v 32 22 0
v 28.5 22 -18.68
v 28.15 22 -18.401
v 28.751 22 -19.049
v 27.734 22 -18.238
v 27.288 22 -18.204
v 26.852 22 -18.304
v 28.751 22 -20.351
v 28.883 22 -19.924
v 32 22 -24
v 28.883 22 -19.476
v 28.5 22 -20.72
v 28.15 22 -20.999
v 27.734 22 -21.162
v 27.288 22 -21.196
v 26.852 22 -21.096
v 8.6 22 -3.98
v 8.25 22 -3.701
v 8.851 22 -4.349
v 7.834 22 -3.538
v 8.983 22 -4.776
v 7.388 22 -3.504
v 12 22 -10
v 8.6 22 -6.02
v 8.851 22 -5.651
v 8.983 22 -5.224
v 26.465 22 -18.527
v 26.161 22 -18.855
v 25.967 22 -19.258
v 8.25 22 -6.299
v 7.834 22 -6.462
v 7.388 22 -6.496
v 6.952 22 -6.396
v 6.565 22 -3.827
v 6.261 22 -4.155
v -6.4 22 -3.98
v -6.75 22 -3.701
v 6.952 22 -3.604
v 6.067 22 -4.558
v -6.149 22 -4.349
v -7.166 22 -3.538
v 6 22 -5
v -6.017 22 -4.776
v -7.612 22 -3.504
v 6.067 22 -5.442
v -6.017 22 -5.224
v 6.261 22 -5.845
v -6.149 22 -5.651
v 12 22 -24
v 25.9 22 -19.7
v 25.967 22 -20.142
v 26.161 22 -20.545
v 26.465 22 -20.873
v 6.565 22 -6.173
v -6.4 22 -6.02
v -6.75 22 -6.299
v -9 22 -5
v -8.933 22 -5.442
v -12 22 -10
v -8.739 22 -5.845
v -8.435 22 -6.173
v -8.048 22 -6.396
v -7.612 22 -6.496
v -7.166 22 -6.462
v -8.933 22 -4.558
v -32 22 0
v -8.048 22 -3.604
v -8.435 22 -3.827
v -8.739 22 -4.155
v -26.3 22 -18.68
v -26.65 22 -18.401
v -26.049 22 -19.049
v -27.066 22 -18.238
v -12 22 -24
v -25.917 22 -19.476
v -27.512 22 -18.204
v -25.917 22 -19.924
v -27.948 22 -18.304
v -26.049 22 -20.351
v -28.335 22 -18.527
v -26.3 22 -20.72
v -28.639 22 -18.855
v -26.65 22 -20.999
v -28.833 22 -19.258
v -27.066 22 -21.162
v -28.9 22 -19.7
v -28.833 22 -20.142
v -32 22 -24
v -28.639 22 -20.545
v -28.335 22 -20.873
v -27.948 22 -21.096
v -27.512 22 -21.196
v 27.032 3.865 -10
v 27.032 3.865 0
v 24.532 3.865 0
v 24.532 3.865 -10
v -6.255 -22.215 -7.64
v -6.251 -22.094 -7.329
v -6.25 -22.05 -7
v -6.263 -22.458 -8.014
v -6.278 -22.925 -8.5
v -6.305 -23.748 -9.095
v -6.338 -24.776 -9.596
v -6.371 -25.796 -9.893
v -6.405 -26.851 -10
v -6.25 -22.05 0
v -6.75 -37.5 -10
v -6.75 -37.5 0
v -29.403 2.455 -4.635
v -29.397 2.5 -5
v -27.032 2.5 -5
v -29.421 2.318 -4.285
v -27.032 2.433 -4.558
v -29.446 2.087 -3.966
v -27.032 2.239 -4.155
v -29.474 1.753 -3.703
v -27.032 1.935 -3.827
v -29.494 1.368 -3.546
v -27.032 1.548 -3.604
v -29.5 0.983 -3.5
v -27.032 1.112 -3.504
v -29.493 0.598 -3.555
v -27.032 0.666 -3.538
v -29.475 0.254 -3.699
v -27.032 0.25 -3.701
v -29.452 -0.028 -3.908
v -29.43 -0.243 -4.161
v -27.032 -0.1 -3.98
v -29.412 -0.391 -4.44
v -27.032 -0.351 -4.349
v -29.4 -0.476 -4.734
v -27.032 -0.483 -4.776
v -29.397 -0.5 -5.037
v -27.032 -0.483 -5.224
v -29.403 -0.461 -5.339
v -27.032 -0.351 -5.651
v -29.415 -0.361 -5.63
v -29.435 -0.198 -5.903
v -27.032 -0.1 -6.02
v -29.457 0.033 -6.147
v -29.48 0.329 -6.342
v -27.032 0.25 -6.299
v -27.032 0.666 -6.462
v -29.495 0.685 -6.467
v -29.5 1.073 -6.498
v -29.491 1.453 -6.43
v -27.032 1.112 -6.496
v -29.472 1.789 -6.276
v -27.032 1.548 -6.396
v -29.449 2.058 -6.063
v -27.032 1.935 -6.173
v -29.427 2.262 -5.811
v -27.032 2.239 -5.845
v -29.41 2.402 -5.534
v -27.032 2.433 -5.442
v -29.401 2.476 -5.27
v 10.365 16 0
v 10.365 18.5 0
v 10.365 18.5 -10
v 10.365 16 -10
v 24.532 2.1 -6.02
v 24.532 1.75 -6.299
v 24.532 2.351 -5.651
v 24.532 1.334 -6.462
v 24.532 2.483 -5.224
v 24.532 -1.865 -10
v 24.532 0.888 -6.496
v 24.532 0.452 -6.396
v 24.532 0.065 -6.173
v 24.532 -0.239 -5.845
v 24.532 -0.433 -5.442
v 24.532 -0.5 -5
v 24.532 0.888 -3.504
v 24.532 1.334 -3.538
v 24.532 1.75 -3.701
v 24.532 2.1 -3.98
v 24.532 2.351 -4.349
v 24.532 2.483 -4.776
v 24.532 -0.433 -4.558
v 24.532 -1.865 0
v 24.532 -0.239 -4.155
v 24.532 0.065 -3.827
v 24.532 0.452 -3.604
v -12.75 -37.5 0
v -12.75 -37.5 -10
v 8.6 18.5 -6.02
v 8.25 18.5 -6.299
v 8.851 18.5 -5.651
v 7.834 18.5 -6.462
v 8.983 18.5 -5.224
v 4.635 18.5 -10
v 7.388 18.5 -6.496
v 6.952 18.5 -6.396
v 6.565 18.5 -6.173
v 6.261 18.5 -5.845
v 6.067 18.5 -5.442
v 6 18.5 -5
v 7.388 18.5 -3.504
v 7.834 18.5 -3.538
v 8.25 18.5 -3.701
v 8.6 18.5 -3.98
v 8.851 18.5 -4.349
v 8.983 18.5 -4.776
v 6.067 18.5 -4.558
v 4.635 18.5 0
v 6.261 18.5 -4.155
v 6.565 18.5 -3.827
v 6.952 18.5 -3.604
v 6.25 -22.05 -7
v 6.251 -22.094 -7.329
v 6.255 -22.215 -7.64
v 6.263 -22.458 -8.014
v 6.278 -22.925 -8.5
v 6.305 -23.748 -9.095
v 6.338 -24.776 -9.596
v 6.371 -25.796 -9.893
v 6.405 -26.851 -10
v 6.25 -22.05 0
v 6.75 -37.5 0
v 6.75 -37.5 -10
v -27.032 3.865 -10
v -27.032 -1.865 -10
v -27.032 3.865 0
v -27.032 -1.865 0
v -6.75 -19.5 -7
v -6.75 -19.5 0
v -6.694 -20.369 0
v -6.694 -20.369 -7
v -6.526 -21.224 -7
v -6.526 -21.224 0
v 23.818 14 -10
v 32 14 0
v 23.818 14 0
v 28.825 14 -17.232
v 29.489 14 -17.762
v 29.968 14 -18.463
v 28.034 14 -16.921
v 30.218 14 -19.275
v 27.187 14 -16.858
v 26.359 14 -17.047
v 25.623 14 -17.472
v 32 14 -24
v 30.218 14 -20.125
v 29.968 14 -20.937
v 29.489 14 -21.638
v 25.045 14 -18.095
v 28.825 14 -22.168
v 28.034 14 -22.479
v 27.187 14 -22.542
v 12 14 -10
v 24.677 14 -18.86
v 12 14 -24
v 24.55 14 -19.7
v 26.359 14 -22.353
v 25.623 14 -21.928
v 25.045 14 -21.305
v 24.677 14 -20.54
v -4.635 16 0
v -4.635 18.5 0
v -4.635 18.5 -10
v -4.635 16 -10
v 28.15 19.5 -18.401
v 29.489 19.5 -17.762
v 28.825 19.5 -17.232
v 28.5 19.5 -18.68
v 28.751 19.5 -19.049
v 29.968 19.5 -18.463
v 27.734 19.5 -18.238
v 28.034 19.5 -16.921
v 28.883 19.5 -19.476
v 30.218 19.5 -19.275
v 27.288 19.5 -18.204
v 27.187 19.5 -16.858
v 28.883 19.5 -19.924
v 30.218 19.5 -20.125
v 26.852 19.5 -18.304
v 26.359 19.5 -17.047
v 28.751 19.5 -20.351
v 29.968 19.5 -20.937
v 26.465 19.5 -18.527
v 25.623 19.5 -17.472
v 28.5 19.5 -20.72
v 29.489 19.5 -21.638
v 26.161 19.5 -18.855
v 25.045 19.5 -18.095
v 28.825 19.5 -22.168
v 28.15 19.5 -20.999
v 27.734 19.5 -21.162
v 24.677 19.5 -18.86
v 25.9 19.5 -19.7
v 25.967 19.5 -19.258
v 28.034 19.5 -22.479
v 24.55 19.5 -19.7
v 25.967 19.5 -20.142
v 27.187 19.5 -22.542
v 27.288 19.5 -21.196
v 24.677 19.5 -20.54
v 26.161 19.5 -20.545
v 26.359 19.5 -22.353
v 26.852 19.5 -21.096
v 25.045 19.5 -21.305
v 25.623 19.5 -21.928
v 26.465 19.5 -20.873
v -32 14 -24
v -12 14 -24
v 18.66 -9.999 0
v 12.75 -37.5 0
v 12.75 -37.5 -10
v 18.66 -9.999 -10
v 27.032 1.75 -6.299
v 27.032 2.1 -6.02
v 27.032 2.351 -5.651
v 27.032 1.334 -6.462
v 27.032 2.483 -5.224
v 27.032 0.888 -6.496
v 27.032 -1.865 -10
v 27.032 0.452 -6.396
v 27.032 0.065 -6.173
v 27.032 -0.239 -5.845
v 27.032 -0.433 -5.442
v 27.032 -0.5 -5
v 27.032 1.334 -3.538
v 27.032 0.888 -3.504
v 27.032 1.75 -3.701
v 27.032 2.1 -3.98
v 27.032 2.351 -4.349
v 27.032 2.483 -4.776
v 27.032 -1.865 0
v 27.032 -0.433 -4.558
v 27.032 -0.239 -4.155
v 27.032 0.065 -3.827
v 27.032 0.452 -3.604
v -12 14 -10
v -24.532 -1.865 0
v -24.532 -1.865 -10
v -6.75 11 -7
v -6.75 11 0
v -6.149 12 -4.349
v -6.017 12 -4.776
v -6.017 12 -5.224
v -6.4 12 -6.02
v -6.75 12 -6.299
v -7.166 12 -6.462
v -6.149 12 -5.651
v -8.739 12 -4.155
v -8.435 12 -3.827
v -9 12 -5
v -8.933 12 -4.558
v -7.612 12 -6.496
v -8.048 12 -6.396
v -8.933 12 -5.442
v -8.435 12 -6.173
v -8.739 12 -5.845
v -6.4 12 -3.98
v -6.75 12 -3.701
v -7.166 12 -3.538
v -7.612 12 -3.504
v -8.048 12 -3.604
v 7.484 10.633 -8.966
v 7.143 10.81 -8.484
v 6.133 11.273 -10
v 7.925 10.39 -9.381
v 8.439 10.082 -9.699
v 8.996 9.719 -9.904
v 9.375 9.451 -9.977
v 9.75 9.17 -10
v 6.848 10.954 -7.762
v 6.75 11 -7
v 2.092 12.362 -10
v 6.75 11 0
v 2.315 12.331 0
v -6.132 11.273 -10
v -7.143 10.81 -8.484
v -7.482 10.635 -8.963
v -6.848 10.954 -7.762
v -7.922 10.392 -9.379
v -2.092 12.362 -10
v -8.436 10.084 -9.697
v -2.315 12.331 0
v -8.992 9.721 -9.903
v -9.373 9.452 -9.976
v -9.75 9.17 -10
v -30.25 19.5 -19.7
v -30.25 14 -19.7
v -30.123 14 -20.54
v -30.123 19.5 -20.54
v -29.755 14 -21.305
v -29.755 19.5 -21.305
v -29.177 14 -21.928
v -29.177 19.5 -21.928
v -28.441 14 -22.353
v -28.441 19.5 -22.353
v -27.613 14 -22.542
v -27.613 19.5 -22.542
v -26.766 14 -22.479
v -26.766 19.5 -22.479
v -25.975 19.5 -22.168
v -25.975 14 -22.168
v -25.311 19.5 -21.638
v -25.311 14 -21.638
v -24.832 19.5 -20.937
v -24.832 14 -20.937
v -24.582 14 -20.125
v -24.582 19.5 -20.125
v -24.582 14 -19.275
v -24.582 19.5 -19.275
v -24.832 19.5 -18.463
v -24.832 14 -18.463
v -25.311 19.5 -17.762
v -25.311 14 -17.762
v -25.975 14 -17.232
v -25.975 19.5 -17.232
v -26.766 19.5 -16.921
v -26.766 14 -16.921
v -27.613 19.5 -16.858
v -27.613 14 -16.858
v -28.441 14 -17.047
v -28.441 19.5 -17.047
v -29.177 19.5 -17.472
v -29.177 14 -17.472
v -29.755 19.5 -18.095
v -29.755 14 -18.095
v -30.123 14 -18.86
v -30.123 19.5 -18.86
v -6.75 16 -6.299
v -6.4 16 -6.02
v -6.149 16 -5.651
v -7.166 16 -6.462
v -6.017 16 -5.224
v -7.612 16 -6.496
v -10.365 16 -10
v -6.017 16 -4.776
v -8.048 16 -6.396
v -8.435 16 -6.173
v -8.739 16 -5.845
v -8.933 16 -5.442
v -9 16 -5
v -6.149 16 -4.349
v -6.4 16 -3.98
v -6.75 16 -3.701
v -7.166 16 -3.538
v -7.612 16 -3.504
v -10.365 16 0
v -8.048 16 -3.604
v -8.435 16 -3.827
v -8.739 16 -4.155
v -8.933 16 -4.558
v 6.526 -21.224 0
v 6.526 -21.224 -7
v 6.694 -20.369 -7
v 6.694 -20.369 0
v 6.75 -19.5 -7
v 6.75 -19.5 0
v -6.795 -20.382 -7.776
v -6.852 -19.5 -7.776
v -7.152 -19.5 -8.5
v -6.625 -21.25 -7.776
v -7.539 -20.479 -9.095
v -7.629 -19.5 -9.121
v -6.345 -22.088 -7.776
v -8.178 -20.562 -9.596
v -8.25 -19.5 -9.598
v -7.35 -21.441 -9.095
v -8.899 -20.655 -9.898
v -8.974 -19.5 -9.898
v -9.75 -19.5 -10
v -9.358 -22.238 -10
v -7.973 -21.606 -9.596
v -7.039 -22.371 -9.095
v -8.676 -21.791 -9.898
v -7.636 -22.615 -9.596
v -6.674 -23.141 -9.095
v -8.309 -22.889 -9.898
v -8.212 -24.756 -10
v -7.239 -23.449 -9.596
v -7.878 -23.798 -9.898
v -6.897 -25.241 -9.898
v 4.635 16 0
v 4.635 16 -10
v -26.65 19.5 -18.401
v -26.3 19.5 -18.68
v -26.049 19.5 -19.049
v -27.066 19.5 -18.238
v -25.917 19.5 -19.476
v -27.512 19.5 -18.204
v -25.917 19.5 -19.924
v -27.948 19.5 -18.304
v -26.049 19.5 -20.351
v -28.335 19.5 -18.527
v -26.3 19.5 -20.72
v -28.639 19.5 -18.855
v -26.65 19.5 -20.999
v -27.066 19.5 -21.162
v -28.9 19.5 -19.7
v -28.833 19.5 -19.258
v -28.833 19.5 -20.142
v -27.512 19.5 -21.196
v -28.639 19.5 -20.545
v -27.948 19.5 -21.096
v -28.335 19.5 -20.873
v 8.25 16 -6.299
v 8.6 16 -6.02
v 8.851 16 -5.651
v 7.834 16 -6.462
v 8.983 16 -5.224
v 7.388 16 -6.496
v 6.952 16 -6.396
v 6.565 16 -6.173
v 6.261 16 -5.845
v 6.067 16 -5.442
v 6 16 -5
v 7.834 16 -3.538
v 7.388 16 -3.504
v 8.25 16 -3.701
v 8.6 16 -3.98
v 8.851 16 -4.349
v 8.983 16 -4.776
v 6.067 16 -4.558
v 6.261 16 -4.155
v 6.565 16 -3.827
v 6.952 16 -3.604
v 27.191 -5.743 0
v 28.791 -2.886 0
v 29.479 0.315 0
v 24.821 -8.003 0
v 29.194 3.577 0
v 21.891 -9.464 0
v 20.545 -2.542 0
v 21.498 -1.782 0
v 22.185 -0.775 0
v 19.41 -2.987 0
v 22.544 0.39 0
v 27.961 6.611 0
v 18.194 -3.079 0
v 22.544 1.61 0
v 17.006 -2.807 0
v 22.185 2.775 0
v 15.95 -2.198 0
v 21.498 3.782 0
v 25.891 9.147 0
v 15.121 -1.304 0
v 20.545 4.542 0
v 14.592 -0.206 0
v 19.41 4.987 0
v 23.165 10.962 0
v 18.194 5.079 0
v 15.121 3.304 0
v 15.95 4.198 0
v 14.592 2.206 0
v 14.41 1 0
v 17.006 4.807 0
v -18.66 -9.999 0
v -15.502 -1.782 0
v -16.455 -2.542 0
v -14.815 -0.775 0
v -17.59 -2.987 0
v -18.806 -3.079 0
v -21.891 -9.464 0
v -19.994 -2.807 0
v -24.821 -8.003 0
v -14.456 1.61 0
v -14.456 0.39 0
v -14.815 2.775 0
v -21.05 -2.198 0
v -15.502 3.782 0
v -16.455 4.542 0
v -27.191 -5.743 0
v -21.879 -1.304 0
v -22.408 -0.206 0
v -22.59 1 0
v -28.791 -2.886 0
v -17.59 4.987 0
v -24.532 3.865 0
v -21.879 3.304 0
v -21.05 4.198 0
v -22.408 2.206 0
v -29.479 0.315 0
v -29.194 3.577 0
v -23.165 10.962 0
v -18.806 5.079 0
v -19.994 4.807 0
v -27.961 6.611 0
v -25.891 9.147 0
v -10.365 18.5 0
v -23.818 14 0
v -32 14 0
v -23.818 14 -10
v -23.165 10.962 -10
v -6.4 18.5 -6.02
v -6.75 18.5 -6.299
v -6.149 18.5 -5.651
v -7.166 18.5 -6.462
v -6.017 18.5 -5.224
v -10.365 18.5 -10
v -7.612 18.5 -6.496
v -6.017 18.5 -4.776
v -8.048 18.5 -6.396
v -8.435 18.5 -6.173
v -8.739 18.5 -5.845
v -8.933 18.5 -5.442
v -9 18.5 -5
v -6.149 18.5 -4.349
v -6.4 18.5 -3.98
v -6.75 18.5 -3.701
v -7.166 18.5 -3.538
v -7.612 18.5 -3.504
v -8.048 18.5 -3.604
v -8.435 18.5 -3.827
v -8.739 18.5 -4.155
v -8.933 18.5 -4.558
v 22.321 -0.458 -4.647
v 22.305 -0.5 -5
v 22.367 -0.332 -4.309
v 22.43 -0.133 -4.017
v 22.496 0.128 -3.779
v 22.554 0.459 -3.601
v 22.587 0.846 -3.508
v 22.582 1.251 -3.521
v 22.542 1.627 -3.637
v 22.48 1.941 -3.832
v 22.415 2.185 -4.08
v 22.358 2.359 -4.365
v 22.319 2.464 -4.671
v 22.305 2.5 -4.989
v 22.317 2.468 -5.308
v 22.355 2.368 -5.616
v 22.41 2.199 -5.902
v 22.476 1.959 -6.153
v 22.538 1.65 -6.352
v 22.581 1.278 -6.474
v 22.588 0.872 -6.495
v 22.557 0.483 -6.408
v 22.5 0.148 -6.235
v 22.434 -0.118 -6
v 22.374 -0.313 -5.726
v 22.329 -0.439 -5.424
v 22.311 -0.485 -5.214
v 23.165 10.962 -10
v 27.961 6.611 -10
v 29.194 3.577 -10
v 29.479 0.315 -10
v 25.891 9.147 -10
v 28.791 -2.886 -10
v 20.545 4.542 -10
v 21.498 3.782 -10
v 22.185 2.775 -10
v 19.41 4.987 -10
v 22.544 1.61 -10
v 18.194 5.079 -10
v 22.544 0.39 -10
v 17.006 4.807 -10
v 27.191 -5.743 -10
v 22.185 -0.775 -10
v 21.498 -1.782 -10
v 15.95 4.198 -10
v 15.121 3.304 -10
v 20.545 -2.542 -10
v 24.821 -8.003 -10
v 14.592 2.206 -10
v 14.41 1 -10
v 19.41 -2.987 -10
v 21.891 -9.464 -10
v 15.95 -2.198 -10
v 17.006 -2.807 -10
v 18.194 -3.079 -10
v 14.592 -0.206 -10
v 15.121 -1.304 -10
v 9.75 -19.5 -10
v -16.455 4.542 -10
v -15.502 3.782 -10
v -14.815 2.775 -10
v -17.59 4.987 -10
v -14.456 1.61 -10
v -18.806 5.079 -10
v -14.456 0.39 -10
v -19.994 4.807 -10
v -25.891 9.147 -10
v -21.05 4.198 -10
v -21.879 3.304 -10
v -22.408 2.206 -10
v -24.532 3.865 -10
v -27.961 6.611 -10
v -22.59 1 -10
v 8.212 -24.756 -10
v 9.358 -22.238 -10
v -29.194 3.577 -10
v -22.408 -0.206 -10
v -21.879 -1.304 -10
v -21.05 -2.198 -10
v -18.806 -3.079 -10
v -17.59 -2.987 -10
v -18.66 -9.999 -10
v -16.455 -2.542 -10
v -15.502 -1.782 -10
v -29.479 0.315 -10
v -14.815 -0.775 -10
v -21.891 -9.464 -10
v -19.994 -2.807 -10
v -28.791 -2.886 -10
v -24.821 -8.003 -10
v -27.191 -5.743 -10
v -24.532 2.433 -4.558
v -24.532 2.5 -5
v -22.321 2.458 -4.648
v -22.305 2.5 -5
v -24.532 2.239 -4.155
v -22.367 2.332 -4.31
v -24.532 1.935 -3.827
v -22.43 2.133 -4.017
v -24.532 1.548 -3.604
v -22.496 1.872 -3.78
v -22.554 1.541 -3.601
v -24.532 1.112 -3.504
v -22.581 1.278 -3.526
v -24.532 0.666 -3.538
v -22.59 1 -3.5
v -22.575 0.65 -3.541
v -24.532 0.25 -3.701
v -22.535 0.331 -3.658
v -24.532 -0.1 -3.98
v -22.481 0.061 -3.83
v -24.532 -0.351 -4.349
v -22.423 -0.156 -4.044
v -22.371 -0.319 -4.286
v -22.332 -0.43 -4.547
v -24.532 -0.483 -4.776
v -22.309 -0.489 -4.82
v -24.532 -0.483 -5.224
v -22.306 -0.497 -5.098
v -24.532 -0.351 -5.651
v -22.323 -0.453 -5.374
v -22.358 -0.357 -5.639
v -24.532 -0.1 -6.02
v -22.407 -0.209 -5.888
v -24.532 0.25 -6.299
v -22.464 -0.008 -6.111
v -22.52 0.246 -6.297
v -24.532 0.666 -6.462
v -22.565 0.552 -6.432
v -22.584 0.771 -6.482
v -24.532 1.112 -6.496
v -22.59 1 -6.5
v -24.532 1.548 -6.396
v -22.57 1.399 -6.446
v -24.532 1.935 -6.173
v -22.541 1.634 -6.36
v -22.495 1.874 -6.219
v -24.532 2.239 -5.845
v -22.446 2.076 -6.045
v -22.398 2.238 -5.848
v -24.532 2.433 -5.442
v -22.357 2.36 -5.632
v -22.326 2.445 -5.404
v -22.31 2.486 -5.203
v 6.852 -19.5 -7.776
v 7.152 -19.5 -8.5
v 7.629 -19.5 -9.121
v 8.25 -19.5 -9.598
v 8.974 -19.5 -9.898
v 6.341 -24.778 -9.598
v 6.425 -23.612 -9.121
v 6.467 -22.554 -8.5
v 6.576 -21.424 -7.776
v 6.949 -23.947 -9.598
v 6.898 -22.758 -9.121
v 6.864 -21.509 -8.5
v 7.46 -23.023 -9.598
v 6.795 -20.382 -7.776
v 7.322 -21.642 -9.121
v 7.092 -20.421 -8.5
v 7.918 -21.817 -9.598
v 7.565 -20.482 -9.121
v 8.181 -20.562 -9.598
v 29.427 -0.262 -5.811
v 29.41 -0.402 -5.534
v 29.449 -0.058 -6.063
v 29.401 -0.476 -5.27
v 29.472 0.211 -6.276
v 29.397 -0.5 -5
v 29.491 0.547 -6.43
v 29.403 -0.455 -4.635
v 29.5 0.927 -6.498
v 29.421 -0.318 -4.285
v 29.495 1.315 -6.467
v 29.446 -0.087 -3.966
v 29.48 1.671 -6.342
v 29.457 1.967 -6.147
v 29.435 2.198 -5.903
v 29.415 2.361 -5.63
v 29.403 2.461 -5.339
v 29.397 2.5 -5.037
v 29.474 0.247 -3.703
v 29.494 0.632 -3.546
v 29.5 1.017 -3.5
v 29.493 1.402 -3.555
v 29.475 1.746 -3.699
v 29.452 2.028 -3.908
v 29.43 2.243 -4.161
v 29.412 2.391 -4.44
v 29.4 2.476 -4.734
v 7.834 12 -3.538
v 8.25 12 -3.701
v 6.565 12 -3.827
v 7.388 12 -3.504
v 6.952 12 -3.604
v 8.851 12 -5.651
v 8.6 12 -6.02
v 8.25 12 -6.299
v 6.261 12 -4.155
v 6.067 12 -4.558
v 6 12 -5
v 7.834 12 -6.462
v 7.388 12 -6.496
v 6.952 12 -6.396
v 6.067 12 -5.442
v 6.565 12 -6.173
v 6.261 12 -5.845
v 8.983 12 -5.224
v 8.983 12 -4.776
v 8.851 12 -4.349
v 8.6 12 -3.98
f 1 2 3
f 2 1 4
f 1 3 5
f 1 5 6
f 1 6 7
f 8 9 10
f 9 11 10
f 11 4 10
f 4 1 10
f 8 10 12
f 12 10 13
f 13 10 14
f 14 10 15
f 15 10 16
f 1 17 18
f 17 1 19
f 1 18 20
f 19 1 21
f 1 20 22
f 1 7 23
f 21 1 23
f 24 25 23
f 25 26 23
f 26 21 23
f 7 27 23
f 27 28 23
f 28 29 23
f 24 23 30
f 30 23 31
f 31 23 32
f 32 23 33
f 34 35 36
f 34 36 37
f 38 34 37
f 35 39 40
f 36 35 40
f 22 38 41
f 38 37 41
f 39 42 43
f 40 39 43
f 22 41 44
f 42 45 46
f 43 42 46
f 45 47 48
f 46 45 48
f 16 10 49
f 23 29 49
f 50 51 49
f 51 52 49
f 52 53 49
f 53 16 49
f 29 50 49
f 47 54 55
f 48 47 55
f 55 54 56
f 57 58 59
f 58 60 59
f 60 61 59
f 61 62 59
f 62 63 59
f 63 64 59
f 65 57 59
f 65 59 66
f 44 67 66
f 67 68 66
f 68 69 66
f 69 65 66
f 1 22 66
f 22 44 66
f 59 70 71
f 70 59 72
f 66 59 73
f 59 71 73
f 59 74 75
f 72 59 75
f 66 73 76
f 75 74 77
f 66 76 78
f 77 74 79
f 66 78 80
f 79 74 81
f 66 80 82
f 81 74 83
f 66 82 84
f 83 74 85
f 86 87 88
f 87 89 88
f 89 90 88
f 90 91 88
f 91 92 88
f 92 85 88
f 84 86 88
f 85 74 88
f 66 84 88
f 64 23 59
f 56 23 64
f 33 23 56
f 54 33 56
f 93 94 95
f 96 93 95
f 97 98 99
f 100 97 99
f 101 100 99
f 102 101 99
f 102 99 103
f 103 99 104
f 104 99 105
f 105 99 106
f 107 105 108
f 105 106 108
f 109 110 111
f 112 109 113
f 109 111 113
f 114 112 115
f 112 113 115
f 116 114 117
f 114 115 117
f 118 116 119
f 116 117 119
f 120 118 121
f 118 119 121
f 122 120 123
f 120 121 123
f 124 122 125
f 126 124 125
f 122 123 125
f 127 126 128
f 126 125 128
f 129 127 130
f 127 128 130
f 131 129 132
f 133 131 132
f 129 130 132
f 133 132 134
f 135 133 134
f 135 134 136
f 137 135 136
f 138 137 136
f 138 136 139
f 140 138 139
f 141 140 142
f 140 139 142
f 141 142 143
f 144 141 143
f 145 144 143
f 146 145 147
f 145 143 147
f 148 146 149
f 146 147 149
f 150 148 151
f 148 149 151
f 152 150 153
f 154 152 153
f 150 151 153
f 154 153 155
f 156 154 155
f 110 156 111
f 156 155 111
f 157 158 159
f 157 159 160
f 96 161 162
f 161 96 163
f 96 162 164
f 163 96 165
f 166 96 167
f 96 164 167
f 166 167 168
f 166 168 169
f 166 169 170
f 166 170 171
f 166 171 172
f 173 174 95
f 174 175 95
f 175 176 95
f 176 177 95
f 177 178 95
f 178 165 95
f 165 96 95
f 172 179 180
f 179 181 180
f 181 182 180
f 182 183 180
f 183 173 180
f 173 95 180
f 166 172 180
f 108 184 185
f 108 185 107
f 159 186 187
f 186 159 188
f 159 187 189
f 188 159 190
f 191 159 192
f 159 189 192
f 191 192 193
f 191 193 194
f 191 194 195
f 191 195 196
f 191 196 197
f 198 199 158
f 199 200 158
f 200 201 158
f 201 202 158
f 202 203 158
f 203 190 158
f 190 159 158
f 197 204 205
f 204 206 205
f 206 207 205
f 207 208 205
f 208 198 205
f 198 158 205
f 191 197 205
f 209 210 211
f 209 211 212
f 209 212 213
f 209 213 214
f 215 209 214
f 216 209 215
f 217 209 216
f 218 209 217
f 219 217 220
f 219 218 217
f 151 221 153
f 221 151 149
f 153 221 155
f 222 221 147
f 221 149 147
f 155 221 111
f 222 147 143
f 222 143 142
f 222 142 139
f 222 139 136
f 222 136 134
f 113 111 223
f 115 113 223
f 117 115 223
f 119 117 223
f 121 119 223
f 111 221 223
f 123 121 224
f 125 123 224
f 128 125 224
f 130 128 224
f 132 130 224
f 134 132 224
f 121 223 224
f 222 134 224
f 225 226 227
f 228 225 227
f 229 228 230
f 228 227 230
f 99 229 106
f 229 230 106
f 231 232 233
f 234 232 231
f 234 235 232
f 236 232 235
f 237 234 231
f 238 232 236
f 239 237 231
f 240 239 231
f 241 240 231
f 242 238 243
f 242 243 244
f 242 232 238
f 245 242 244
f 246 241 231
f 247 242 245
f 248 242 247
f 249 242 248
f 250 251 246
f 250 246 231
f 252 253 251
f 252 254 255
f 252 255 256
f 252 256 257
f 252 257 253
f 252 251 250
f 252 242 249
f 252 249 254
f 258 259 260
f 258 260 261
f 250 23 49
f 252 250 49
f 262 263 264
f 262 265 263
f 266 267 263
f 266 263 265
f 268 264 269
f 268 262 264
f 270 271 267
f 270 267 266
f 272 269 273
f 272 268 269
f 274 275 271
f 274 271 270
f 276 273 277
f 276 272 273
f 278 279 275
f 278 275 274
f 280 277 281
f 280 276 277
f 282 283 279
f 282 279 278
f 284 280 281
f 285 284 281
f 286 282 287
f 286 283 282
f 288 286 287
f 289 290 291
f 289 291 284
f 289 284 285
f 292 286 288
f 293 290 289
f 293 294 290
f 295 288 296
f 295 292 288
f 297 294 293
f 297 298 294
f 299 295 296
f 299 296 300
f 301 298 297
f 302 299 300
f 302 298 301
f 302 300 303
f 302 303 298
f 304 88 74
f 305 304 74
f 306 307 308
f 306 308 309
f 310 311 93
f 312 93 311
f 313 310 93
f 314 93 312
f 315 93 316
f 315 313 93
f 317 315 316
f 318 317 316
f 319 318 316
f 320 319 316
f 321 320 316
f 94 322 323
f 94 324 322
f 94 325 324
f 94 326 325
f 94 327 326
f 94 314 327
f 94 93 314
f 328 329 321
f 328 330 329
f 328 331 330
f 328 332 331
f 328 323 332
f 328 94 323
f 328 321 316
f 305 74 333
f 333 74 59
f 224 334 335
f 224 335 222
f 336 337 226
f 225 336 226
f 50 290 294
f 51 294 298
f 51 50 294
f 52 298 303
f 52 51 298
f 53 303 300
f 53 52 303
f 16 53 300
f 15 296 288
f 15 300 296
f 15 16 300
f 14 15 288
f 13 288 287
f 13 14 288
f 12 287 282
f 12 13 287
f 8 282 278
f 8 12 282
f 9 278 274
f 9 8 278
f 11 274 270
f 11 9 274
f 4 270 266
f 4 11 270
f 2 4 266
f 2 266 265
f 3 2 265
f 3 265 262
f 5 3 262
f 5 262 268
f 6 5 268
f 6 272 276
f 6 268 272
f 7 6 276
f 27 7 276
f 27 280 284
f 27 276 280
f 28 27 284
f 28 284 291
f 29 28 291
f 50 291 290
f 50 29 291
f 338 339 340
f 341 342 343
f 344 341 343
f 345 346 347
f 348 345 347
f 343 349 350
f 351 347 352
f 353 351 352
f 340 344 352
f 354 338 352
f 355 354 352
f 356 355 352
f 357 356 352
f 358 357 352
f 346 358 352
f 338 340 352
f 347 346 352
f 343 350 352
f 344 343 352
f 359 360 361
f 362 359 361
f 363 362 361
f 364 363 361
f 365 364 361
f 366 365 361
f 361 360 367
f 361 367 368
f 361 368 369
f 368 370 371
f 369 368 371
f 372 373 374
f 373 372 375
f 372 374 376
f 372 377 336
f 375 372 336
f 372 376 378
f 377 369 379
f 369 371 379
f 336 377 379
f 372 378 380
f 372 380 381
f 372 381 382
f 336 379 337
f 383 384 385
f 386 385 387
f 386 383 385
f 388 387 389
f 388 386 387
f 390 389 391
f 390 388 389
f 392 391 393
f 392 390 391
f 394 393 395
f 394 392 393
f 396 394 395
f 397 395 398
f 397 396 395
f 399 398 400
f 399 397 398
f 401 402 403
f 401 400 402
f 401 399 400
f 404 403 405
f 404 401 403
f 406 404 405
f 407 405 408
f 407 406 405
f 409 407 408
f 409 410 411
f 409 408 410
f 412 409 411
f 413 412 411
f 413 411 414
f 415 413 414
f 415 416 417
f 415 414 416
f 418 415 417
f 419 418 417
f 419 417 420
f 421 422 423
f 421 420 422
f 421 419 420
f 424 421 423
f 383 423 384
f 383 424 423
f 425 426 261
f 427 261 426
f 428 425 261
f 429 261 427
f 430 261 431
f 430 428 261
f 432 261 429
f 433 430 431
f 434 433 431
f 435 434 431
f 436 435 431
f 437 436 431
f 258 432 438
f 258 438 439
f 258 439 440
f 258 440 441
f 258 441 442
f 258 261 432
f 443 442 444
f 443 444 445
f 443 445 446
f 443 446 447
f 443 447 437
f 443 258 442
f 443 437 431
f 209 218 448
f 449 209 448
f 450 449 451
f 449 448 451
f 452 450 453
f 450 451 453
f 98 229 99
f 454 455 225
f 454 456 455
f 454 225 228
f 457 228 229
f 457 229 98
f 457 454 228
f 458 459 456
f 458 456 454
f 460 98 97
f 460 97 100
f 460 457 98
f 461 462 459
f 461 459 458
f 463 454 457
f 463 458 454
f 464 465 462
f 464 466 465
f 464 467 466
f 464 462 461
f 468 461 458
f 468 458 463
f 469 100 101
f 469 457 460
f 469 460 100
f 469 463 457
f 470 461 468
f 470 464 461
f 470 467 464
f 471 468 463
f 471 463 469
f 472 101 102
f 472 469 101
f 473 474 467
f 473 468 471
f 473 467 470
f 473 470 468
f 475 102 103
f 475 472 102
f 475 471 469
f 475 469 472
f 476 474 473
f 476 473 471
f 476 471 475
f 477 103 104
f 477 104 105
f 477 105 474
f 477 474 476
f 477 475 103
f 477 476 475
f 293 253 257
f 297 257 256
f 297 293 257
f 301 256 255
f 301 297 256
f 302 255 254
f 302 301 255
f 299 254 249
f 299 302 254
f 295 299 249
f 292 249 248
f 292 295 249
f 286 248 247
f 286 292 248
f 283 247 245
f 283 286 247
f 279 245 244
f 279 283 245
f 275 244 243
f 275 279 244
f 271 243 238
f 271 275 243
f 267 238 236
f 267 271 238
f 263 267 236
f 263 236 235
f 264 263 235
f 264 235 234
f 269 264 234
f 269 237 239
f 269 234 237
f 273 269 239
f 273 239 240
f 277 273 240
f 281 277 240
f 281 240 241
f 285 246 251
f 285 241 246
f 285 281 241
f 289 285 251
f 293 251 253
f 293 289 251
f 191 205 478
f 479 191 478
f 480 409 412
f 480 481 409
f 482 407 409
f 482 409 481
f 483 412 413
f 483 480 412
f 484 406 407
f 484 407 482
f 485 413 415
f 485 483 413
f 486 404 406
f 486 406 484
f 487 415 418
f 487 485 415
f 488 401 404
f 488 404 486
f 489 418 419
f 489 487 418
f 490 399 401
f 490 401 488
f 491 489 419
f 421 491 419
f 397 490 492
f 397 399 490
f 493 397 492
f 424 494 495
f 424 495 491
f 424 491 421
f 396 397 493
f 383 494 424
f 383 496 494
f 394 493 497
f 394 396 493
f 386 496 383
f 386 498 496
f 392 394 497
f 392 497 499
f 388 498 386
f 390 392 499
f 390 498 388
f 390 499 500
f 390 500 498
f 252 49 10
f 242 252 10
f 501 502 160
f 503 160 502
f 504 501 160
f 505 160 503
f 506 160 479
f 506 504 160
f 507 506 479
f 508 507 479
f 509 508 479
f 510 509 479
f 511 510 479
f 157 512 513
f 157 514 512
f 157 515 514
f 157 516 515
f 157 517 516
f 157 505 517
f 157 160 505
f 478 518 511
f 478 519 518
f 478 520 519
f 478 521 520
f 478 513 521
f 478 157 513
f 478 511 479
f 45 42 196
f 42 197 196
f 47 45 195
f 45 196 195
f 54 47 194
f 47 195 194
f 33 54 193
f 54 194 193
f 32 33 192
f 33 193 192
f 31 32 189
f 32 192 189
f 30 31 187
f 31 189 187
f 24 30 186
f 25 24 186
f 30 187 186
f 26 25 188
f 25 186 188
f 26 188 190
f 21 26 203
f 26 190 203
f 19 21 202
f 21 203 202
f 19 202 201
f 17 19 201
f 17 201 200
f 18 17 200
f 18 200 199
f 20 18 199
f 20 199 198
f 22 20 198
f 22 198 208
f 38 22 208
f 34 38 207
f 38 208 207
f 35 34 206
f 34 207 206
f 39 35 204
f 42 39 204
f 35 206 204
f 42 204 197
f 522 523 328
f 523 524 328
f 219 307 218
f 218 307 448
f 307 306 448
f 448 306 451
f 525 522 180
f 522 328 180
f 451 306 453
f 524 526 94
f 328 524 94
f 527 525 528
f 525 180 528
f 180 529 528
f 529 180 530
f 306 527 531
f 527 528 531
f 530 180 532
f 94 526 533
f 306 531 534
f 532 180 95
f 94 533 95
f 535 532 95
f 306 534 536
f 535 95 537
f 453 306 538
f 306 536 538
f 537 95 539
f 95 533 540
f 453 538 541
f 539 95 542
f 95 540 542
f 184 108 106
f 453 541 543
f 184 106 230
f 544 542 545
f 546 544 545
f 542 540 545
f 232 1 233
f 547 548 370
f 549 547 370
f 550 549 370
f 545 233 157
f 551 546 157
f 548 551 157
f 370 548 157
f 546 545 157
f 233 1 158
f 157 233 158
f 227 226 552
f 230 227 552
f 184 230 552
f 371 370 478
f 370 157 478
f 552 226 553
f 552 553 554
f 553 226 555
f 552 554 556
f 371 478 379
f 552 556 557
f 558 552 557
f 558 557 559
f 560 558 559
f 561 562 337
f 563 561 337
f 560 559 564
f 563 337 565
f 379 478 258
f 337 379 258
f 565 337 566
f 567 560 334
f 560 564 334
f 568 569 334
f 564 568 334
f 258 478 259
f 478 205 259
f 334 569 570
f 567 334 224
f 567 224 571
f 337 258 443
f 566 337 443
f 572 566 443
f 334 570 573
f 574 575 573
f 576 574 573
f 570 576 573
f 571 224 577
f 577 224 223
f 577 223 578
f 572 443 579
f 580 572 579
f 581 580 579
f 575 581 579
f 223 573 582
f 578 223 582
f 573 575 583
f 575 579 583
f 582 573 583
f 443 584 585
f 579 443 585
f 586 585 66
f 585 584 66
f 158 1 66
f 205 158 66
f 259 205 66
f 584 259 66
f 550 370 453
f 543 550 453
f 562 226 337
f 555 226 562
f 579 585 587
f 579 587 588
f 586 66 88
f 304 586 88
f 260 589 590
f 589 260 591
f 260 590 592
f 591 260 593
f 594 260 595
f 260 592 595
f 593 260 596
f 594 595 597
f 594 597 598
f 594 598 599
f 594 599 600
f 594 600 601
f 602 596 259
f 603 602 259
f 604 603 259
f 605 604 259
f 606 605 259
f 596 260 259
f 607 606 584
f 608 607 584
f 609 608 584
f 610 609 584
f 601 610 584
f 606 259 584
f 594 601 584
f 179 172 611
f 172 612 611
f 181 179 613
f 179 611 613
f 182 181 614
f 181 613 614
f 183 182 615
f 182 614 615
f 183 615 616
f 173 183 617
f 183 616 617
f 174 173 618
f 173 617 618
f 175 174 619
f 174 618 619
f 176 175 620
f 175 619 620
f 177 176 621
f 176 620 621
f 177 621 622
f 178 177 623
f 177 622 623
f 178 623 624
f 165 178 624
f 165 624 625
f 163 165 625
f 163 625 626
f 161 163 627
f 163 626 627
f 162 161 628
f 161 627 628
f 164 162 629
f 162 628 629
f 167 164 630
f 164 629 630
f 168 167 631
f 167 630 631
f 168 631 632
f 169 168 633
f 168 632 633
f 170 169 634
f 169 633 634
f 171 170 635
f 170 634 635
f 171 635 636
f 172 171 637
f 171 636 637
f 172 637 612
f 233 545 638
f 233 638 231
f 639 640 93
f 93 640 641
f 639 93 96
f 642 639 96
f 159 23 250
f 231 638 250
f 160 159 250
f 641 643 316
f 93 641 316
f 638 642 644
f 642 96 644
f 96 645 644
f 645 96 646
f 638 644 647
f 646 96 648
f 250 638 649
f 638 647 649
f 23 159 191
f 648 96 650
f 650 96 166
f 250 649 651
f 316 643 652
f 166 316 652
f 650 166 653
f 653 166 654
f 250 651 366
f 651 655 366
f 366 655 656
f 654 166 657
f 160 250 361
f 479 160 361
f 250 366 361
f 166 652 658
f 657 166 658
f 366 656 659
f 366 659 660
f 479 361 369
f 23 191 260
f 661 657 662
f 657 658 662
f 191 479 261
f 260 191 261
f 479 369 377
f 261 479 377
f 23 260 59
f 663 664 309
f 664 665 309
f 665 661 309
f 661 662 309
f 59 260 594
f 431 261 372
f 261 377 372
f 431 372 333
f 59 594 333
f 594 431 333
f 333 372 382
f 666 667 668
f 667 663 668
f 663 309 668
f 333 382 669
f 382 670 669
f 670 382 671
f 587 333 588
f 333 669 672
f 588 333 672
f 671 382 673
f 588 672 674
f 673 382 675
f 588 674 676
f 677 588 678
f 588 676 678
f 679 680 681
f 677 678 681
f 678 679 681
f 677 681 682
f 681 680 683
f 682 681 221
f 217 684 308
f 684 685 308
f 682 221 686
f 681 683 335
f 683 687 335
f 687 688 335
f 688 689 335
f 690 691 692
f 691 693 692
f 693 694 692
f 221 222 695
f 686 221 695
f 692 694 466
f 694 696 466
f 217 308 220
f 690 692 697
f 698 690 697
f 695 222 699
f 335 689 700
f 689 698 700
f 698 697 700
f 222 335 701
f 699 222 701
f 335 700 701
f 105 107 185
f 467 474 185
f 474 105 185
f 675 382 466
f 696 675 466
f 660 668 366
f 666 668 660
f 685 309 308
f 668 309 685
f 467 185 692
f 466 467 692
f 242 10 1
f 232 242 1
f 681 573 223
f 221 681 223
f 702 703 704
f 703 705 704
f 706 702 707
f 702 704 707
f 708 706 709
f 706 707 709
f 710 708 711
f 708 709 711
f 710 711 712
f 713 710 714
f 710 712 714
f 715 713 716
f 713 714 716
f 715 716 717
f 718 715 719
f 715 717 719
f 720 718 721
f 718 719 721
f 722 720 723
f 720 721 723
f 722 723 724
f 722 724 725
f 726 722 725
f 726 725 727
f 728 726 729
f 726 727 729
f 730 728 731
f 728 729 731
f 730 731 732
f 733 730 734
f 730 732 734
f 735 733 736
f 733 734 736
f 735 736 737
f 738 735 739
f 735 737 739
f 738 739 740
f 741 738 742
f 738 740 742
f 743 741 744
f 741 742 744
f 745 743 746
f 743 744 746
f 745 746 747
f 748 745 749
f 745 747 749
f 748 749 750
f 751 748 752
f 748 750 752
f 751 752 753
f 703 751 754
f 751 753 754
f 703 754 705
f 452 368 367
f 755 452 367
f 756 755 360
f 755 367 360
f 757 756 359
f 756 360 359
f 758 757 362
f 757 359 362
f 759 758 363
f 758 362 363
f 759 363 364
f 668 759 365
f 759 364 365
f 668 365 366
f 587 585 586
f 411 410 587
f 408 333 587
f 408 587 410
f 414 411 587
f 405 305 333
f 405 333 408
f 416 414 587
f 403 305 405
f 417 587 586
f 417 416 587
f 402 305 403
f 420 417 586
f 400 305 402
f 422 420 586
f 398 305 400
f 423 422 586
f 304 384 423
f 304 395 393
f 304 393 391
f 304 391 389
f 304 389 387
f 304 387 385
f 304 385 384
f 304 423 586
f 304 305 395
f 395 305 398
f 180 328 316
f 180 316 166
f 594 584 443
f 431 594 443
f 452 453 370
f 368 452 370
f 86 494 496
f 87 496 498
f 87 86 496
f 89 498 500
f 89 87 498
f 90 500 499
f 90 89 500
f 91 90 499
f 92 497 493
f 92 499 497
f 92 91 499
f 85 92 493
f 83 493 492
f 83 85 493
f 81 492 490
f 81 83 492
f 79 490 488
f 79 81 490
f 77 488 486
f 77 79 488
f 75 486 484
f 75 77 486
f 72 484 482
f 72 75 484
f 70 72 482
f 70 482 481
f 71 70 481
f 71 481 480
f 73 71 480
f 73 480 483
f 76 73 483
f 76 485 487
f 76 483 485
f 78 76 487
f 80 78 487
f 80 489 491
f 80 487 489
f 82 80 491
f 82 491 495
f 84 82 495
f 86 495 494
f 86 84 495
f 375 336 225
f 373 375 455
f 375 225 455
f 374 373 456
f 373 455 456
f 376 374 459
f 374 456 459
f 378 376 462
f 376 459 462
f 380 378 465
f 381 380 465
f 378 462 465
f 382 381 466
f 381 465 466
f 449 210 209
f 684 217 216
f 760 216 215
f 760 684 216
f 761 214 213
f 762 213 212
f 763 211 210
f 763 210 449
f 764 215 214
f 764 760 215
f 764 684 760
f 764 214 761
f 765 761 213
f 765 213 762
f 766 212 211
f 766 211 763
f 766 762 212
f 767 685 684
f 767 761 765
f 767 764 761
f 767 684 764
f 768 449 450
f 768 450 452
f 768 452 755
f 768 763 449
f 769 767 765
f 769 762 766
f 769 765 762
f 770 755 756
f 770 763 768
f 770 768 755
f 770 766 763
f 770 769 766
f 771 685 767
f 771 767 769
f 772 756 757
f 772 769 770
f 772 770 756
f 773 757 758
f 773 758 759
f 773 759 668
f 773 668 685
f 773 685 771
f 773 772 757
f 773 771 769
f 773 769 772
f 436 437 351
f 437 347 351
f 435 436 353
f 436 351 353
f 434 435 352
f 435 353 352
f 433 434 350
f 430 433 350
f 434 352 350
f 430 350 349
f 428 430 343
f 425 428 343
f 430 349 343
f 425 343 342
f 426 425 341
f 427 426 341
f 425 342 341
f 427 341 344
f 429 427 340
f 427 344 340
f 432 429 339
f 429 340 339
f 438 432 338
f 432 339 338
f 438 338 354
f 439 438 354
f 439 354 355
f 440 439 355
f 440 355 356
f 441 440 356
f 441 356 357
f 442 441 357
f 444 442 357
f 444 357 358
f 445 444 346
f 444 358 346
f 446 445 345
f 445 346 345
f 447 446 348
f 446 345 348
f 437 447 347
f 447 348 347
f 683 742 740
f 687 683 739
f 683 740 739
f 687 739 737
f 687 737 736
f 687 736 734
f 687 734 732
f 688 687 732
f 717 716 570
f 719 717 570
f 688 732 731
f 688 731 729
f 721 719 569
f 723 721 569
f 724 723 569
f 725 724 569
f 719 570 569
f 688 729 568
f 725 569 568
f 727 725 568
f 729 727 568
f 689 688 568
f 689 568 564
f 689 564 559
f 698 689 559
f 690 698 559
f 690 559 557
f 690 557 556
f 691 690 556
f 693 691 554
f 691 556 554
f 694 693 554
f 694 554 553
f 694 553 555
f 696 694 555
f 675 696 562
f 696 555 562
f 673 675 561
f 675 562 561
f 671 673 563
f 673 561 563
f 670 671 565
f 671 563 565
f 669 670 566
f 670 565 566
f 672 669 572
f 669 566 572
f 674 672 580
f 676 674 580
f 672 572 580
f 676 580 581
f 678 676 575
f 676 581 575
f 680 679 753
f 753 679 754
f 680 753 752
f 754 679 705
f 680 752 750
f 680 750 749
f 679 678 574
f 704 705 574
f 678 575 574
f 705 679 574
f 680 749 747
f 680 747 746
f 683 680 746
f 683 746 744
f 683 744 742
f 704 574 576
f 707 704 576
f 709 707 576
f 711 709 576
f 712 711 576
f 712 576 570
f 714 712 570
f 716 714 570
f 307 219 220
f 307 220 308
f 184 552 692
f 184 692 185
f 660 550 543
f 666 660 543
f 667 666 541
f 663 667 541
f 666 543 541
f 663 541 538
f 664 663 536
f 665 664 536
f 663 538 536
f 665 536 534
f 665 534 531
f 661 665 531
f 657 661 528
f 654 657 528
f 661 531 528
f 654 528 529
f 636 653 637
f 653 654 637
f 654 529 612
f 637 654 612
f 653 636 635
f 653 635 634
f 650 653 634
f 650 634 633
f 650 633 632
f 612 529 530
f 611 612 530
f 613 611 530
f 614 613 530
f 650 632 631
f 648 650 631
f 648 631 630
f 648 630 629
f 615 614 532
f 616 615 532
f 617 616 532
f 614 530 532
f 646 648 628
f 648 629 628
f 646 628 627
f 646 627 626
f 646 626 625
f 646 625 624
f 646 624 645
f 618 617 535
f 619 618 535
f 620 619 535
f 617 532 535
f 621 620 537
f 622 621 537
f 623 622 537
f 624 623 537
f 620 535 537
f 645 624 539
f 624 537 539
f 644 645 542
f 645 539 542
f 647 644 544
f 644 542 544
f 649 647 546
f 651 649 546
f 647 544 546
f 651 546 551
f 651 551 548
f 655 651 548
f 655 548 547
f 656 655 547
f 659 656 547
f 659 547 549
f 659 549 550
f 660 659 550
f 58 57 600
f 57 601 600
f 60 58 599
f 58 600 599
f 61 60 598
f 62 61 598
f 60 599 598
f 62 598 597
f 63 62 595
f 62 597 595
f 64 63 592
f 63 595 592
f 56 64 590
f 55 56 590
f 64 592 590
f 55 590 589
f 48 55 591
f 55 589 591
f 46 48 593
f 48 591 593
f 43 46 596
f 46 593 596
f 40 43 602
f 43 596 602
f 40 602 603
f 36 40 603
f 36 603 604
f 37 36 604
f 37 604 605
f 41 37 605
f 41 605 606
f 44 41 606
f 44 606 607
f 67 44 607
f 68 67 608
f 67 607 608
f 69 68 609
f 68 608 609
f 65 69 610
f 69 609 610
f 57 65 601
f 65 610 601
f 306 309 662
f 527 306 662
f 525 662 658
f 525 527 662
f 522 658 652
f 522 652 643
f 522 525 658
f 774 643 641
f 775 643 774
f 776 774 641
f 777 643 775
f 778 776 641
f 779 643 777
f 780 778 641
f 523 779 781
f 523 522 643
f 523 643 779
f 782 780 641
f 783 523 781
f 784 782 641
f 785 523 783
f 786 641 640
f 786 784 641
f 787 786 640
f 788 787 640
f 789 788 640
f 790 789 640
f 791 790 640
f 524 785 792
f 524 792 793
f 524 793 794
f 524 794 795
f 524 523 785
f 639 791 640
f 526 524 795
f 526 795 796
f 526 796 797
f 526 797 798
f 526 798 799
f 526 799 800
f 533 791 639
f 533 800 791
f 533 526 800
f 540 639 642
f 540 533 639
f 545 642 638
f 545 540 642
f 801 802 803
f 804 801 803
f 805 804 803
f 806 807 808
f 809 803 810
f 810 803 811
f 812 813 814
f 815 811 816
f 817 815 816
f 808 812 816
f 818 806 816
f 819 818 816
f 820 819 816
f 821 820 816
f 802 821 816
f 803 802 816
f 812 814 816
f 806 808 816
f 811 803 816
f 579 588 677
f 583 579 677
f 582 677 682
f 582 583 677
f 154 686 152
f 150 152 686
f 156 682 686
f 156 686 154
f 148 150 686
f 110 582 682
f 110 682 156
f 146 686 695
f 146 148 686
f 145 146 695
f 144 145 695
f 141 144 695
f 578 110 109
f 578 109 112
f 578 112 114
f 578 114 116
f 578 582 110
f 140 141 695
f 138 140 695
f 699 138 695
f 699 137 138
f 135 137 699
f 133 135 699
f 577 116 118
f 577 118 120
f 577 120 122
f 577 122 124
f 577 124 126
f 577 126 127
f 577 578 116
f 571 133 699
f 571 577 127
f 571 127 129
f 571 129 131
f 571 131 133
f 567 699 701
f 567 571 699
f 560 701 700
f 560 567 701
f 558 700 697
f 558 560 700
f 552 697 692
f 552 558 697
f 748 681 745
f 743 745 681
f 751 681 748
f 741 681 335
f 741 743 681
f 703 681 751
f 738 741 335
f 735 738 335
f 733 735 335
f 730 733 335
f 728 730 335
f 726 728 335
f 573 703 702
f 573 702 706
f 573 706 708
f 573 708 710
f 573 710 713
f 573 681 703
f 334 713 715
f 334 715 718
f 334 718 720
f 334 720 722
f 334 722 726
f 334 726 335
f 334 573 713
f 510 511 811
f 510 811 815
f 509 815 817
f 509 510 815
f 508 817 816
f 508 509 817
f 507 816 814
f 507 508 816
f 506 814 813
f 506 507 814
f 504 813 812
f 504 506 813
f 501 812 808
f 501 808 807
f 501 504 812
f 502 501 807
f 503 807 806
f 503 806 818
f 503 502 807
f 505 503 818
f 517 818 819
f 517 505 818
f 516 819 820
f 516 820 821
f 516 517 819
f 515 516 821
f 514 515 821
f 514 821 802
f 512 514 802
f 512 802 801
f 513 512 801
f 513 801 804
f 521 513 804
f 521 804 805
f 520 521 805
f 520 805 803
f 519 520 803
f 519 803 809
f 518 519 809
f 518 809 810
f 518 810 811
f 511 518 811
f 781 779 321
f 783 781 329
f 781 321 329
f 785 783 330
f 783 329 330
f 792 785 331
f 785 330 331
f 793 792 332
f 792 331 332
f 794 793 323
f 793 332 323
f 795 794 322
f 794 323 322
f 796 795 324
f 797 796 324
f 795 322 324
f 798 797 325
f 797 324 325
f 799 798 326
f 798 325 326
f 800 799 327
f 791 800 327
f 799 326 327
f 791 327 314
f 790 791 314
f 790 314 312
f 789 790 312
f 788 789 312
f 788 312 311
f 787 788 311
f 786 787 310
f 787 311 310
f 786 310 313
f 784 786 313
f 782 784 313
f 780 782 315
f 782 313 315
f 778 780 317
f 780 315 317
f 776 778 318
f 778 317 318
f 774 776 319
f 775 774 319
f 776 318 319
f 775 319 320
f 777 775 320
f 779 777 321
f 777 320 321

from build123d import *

# Parameters (mm, degrees)
PAD006_DEPTH            = 10
FILLET001_R             = 3
PAD013_DEPTH            = 10
SKETCH022_R             = 4.09
SKETCH022_W             = 2.5
SKETCH022_H             = 5.73
SKETCH022_W_2           = 5.73
SKETCH022_H_2           = 2.5
POCKET013_DEPTH         = 10.001
POCKET013_DEPTH_BACK    = 0.001
SKETCH023_R             = 1.5
POCKET014_DEPTH         = 7.5
SKETCH024_R             = 1.5
PAD019_DEPTH            = 8
SKETCH043_R             = 2.85
POCKET026_DEPTH         = 57.001
SKETCH047_R             = 1.5
POCKET029_DEPTH         = 5
SKETCH048_R             = 1.5
POCKET030_DEPTH         = 5
BODY005_ROLL_ANGLE      = -90
BODY005_PLACEMENT_ANGLE = 180


with BuildPart() as part:
    # Sketch006 → Pad006 (new body)
    with BuildSketch(Plane.XZ):
        with BuildLine():
            Line((18.25, 57), (12.25, 57))
            Line((12.25, 57), (0, 0))
            Line((0, 0), (0, -2.5))
            Line((0, -2.5), (50, -2.5))
            Line((50, -2.5), (50, 0))
            Line((50, 0), (37.75, 57))
            Line((37.75, 57), (31.75, 57))
            Line((31.25, 41.54951), (31.75, 57))
            ThreePointArc((31.75, 39), (31.623821, 40.299038), (31.25, 41.54951))
            Line((31.749951, 8.5), (31.75, 39))
            ThreePointArc((18.249951, 8.5), (24.999951, 7), (31.749951, 8.5))
            Line((18.25, 39), (18.249951, 8.5))
            ThreePointArc((18.75, 41.54951), (18.376179, 40.299038), (18.25, 39))
            Line((18.75, 41.54951), (18.25, 57))
        make_face()
    extrude(amount=-PAD006_DEPTH)

    # Fillet001
    fillet001_edges = [part.edges().sort_by_distance(p)[0] for p in [
        (31.749976, 10, 23.75),
        (18.249976, 10, 23.75),
        (18.376179, 10, 40.299038),
        (31.623821, 10, 40.299038),
    ]]
    fillet(fillet001_edges, radius=FILLET001_R)

    # Sketch021 → Pad013 (join)
    with BuildSketch(Plane.XZ):
        with BuildLine():
            ThreePointArc((15.25, 25.166146), (-4.5, 18.5), (15.25, 11.833854))
            Line((15.25, 25.166146), (15.25, 11.833854))
        make_face()
        with BuildLine():
            ThreePointArc((34.75, 11.833854), (54.5, 18.5), (34.75, 25.166146))
            Line((34.75, 25.166146), (34.75, 11.833854))
        make_face()
    extrude(amount=-PAD013_DEPTH)

    # Sketch022 → Pocket013 (cut, two sides)
    with BuildSketch(Plane.XZ) as pocket013_sk:
        with Locations((43.5, 18.5)):
            Circle(SKETCH022_R)
        with Locations((6.5, 18.5)):
            Circle(SKETCH022_R)
        with Locations((-0.78181, 18.5)):
            Rectangle(SKETCH022_W, SKETCH022_H)
        with Locations((50.78181, 18.5)):
            Rectangle(SKETCH022_W, SKETCH022_H)
        with Locations((32.5, 2.25)):
            Rectangle(SKETCH022_W_2, SKETCH022_H_2)
        with Locations((17.5, 2.25)):
            Rectangle(SKETCH022_W_2, SKETCH022_H_2)
    extrude(amount=-POCKET013_DEPTH, mode=Mode.SUBTRACT)
    extrude(pocket013_sk.sketch, amount=POCKET013_DEPTH_BACK, mode=Mode.SUBTRACT)

    # Sketch023 → Pocket014 (cut, symmetric)
    with BuildSketch(Plane.XY):
        with Locations((17.5, 5)):
            Circle(SKETCH023_R)
        with Locations((32.5, 5)):
            Circle(SKETCH023_R)
    extrude(amount=POCKET014_DEPTH, both=True, mode=Mode.SUBTRACT)

    # Sketch024 → Pad019 (join)
    with BuildSketch(Plane.XY.offset(-2.5)):
        Polygon((57, 0), (57, 24), (37, 24), (37, 0), (50, 0), align=None)
        with Locations((52.4, 19.7)):
            Circle(SKETCH024_R, mode=Mode.SUBTRACT)
        Polygon((-7, 24), (-7, 0), (0, 0), (13, 0), (13, 24), align=None)
        with Locations((-2.4, 19.7)):
            Circle(SKETCH024_R, mode=Mode.SUBTRACT)
    extrude(amount=PAD019_DEPTH)

    # Sketch043 → Pocket026 (cut, through all)
    with BuildSketch(Plane.XY):
        with Locations((-2.4, 19.7)):
            Circle(SKETCH043_R)
        with Locations((52.4, 19.7)):
            Circle(SKETCH043_R)
    extrude(amount=POCKET026_DEPTH, mode=Mode.SUBTRACT)

    # Sketch047 (on DatumPlane) → Pocket029 (cut, symmetric)
    with BuildSketch(Plane(origin=(52.03181, 0, 0), x_dir=(0, 0, -1), z_dir=(-1, 0, 0))):
        with Locations((-18.5, -5)):
            Circle(SKETCH047_R)
    extrude(amount=POCKET029_DEPTH, both=True, mode=Mode.SUBTRACT)

    # Sketch048 (on DatumPlane) → Pocket030 (cut, symmetric)
    with BuildSketch(Plane(origin=(-2.03181, 0, 0), x_dir=(0, 0, 1), z_dir=(1, 0, 0))):
        with Locations((18.5, -5)):
            Circle(SKETCH048_R)
    extrude(amount=POCKET030_DEPTH, both=True, mode=Mode.SUBTRACT)


with BuildPart() as part_1:
    # Body005 roll: moved
    add(part.part.rotate(Axis((0, 0, 0), (1, 0, 0)), BODY005_ROLL_ANGLE))


with BuildPart() as part_2:
    # Body005 placement: moved
    add(part_1.part.moved(Location((25, 19.5, 0))).rotate(Axis((25, 19.5, 0), (0, 0, 1)), BODY005_PLACEMENT_ANGLE))


solid = part_2.part
